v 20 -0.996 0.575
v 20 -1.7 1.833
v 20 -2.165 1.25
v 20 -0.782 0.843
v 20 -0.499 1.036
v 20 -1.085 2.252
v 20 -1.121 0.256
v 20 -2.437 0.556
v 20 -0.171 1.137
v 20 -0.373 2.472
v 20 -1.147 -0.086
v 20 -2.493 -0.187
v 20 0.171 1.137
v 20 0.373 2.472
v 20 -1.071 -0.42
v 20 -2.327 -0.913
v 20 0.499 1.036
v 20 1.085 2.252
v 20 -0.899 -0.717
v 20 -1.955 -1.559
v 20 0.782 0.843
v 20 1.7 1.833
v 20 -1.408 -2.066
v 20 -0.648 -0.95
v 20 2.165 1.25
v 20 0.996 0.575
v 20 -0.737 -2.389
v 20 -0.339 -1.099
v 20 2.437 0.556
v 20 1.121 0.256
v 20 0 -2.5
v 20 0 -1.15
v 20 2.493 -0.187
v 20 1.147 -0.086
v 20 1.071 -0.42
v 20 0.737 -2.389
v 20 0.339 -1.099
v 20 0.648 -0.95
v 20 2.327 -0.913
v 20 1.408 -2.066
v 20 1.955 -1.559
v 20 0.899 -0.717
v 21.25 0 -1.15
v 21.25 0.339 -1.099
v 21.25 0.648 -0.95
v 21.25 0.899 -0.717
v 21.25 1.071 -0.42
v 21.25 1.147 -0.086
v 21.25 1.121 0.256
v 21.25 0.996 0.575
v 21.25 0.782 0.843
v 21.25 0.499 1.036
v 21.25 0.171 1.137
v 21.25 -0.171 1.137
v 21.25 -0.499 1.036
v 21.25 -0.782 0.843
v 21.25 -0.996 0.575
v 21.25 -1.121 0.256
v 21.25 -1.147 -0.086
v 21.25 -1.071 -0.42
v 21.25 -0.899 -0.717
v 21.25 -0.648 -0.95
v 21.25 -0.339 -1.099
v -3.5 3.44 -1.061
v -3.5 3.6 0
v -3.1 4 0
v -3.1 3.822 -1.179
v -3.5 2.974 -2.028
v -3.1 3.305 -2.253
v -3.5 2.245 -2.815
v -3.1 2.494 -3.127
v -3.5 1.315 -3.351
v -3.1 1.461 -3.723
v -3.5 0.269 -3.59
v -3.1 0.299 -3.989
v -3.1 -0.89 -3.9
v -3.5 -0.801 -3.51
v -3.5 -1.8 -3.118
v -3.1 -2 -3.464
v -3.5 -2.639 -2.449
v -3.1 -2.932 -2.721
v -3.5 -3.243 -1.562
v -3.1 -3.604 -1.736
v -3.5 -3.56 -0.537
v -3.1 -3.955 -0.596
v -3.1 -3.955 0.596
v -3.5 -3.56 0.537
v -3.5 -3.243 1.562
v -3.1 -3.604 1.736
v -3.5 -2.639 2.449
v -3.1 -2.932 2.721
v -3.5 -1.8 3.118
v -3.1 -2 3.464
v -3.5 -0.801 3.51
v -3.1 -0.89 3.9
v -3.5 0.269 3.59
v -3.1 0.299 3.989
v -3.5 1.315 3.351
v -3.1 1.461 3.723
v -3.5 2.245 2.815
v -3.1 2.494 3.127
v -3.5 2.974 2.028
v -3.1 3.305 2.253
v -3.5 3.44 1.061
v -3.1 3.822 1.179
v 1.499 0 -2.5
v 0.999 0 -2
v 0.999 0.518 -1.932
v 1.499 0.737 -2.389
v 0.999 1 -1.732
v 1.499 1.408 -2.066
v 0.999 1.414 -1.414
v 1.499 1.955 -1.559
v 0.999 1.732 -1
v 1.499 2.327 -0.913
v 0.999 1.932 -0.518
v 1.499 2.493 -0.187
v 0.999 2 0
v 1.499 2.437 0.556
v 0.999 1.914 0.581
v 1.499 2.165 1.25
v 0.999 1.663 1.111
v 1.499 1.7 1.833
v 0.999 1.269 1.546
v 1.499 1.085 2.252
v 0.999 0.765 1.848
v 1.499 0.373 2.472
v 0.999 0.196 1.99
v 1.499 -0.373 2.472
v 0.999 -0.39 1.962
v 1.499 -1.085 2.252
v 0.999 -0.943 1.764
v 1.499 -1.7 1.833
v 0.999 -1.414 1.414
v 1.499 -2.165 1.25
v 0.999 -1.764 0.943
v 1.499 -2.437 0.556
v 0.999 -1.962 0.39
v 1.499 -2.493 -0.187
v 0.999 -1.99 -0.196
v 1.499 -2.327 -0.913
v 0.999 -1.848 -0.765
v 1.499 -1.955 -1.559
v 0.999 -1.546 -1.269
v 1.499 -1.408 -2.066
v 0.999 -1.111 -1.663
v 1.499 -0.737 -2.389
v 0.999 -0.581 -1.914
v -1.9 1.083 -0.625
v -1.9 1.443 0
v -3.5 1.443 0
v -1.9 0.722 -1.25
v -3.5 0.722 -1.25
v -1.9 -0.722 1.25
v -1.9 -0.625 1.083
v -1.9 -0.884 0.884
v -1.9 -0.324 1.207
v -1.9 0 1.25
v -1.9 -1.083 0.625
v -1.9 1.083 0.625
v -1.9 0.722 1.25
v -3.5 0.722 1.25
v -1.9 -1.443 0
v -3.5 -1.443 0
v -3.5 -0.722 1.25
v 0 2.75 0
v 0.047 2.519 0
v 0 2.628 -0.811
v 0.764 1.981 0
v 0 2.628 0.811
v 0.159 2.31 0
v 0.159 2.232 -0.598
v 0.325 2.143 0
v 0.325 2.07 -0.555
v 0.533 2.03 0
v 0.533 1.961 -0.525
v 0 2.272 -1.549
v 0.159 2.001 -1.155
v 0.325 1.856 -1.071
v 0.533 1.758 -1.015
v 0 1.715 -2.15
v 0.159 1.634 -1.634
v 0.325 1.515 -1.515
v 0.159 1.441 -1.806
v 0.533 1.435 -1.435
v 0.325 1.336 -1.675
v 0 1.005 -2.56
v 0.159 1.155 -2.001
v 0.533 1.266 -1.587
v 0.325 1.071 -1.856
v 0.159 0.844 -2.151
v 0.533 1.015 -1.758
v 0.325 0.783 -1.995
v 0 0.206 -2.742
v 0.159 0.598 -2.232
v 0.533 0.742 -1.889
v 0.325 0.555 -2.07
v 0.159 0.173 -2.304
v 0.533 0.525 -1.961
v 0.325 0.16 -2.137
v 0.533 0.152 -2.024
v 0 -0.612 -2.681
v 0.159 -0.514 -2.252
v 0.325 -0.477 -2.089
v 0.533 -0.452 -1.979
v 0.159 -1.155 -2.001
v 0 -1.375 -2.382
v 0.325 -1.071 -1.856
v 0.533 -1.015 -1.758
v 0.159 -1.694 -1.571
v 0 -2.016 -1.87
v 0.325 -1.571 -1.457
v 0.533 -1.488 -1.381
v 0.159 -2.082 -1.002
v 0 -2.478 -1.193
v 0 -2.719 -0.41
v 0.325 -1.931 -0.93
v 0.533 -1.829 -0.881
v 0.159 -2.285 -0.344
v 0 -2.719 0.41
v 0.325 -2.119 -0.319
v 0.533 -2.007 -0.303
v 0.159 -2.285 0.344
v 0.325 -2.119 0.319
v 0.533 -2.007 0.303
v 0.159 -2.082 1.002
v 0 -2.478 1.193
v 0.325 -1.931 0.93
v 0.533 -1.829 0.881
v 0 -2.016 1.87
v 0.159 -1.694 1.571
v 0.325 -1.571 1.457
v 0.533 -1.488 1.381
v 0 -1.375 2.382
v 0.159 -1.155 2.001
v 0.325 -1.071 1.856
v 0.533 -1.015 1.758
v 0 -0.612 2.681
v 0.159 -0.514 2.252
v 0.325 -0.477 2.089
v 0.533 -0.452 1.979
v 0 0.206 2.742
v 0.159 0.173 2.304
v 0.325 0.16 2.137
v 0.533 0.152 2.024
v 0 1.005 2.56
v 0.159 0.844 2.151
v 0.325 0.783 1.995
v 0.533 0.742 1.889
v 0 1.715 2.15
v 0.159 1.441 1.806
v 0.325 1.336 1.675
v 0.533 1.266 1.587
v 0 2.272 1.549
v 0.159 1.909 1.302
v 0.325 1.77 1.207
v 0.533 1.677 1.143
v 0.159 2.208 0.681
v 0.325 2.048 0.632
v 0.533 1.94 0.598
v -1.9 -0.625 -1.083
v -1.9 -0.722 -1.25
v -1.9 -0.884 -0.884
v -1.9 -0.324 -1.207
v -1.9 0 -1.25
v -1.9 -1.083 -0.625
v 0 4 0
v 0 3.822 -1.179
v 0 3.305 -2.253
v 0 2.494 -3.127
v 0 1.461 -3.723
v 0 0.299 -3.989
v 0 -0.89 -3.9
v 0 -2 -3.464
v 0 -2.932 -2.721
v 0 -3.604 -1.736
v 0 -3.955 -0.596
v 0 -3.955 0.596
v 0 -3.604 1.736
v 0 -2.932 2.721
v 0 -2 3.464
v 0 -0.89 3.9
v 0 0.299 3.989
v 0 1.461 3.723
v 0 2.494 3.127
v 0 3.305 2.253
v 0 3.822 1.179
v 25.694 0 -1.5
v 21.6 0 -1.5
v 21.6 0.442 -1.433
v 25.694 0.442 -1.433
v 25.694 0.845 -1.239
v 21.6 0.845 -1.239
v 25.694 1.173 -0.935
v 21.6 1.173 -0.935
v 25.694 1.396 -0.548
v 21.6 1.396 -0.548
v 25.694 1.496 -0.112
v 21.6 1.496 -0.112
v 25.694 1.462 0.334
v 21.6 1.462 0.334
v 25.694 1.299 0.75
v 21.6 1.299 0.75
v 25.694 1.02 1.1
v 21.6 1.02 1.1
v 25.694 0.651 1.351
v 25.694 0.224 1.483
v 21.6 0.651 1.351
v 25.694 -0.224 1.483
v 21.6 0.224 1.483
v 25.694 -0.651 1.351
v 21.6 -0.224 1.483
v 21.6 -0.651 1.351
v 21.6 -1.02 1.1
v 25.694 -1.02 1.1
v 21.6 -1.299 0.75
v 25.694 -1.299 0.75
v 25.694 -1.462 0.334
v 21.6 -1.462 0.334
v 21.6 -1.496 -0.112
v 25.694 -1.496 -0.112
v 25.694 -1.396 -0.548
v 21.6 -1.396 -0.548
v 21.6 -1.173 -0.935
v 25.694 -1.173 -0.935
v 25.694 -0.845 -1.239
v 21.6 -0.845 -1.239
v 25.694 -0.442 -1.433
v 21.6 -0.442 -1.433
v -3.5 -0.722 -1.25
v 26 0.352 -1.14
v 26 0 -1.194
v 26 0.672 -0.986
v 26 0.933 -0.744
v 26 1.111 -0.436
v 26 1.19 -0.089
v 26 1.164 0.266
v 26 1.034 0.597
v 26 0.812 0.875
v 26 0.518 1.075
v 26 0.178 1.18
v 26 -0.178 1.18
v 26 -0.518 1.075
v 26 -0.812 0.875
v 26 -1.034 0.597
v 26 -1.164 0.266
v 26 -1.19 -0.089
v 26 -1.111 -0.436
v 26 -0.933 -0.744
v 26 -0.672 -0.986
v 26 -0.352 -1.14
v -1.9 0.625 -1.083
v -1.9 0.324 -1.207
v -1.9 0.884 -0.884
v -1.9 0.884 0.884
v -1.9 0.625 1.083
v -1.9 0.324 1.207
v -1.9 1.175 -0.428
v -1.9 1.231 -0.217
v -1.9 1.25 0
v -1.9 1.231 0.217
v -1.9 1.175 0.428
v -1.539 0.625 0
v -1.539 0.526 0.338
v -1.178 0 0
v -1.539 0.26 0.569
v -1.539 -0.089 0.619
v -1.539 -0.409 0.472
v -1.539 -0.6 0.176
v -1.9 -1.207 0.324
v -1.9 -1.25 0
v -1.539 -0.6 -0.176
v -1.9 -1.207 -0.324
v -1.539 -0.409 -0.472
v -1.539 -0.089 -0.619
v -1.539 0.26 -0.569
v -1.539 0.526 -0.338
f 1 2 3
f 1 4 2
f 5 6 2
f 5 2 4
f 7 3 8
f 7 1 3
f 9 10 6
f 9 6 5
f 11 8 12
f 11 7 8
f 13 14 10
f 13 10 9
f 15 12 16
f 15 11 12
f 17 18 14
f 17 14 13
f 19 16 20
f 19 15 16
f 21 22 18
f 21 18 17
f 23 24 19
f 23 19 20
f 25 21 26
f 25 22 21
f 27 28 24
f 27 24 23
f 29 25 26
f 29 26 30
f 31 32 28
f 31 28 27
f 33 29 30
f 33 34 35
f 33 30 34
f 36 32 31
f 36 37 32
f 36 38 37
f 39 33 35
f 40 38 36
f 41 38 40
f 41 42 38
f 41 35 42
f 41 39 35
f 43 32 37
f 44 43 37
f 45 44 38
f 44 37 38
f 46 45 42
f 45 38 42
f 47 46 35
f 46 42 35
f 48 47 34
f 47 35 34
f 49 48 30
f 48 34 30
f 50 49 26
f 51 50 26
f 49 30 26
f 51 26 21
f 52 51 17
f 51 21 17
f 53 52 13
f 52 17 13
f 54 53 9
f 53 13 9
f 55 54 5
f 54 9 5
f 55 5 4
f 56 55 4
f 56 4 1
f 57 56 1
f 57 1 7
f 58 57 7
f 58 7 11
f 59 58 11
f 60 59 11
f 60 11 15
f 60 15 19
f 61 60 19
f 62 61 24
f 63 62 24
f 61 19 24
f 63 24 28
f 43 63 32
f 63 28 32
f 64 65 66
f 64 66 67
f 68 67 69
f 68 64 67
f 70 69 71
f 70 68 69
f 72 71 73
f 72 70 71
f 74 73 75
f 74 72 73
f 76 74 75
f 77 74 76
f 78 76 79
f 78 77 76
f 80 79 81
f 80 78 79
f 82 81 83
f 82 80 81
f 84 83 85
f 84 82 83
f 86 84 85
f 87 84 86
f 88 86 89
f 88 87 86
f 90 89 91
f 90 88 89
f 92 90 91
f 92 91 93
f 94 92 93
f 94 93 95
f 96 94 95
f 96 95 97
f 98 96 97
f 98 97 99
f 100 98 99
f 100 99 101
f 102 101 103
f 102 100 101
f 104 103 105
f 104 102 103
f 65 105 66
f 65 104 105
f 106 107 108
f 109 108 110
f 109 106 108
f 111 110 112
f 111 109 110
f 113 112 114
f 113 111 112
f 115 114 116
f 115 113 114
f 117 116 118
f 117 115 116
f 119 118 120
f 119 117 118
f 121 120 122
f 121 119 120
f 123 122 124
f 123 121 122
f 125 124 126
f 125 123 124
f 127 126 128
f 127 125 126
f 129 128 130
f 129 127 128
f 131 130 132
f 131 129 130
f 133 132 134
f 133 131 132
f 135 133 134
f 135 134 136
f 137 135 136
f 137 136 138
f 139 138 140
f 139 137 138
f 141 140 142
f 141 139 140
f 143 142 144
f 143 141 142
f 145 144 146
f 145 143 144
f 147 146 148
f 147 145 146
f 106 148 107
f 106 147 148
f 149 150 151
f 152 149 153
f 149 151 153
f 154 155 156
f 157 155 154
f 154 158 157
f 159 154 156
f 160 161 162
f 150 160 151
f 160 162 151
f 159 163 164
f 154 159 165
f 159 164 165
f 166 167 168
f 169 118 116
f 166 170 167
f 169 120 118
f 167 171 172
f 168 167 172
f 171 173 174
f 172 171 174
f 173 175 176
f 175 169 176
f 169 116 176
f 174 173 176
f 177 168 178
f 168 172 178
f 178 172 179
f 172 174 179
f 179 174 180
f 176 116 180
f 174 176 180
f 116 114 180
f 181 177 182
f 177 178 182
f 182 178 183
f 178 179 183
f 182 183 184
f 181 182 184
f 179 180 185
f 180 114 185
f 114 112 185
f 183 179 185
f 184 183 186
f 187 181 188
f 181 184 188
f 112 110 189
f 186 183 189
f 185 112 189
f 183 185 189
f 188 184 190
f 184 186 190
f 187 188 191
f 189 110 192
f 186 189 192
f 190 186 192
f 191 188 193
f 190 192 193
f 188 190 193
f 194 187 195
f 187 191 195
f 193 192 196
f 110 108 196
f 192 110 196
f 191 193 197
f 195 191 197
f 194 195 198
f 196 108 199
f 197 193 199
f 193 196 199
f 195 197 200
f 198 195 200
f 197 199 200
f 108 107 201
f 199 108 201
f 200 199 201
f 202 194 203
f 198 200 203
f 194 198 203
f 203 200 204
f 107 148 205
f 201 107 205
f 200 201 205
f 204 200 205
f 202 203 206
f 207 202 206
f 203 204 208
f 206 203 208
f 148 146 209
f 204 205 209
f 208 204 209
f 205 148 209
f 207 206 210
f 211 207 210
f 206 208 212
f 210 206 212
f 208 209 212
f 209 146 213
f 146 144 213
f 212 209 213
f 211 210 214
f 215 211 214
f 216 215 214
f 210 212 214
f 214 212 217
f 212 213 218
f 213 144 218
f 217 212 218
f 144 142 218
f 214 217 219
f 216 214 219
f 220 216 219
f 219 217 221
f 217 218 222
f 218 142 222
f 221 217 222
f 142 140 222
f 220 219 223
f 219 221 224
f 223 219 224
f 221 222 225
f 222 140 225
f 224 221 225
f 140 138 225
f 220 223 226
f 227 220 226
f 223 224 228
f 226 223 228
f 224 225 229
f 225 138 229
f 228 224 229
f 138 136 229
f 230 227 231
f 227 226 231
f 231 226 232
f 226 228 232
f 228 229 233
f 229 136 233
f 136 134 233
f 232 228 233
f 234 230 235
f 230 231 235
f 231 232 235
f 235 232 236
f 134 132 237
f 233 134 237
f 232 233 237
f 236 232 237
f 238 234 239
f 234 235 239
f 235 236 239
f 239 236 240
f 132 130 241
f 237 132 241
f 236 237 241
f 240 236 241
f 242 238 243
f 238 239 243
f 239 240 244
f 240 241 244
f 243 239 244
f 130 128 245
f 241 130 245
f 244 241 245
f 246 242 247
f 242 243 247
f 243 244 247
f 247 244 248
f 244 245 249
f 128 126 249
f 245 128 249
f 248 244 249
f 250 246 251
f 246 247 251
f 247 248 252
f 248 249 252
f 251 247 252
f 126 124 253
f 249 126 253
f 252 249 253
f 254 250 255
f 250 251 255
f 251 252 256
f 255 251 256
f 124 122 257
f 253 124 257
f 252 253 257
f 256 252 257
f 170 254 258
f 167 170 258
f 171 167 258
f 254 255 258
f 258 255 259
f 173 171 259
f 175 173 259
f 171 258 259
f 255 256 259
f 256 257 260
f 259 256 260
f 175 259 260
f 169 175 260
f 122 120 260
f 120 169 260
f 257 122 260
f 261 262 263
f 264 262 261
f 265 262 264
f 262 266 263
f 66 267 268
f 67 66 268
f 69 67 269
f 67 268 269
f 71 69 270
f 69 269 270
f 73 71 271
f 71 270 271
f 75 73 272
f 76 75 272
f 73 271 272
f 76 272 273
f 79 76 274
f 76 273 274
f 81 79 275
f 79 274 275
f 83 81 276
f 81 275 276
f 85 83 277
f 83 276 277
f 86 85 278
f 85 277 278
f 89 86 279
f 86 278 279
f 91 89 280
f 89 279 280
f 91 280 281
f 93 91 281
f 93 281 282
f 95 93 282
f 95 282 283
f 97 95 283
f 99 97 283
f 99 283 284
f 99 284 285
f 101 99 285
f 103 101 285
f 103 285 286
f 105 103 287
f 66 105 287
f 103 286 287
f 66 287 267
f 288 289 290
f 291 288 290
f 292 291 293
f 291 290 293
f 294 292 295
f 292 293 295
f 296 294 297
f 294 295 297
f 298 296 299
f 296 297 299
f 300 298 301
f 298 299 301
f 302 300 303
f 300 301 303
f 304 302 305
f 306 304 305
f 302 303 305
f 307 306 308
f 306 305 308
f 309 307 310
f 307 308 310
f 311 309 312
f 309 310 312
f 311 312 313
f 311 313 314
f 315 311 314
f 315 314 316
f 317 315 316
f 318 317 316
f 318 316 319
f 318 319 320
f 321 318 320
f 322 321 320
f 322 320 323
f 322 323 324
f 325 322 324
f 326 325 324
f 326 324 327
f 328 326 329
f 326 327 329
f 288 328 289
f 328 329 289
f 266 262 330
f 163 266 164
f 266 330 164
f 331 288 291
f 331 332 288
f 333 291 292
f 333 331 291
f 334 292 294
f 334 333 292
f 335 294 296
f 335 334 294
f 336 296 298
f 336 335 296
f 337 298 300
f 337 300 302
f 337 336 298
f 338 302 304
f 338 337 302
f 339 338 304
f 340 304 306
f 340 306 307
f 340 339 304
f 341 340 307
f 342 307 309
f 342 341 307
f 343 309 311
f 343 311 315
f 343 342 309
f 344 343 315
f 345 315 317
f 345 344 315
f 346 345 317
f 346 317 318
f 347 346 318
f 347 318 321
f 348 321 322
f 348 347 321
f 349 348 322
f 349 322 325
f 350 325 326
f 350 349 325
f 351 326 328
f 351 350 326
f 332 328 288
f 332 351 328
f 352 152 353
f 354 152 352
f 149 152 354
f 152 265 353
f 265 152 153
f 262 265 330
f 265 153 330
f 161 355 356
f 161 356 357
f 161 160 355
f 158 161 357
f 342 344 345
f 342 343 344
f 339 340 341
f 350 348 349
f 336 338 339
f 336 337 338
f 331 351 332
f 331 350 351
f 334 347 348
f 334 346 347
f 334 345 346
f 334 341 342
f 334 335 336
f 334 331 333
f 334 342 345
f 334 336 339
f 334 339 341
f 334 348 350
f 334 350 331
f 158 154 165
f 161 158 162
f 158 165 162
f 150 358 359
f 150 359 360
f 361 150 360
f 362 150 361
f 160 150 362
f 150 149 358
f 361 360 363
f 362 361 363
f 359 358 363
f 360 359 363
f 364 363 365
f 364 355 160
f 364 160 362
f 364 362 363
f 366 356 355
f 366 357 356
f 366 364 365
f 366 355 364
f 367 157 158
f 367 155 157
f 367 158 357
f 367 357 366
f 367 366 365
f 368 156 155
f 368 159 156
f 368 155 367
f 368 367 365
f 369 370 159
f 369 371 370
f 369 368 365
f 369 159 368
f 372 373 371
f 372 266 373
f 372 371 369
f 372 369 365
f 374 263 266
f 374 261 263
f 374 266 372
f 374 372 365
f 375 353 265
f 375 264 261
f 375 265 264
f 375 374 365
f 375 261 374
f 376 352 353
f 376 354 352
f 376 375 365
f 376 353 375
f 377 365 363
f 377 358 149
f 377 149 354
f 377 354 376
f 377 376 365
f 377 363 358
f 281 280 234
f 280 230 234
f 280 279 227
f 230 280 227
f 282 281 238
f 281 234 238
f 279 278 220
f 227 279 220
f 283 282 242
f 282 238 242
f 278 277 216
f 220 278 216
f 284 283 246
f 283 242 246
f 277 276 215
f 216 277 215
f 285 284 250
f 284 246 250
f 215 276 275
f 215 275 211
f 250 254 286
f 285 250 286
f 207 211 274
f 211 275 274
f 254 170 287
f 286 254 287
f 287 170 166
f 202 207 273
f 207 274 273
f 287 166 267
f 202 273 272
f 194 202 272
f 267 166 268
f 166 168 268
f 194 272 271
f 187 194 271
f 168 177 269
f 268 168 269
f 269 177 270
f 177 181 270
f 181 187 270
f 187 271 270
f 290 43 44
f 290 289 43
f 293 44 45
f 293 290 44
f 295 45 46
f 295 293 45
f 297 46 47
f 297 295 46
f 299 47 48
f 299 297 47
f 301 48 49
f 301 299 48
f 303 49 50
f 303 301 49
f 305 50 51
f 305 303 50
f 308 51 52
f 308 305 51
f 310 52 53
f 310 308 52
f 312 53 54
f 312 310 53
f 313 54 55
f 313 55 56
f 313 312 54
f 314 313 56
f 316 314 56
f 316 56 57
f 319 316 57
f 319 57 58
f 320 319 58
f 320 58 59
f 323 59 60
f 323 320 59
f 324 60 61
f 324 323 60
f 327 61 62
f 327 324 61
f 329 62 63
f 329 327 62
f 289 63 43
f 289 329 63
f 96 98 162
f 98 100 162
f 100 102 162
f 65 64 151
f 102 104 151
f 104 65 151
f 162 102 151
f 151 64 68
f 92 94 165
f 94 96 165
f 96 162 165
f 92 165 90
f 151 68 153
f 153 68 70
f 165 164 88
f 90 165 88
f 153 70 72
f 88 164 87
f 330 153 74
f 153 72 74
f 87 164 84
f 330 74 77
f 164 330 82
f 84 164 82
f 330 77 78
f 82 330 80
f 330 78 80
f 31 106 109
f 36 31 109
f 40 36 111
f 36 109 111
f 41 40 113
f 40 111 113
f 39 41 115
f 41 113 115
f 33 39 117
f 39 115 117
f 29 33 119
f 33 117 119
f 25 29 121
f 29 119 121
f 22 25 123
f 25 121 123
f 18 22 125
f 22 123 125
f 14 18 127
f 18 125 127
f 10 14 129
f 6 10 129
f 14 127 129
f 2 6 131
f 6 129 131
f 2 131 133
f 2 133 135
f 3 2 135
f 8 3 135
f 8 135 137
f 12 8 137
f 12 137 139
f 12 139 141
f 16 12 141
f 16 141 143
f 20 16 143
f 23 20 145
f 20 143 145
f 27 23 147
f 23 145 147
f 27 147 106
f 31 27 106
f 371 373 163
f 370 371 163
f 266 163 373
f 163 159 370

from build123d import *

# Parameters (mm, degrees)
SKETCH2_R           = 2
BOSS_EXTRUDE1_DEPTH = 0.5
BOSS_EXTRUDE1_TAPER = -45
SKETCH3_R           = 2.5
BOSS_EXTRUDE2_DEPTH = 18.501
SKETCH4_R           = 1.15
BOSS_EXTRUDE3_DEPTH = 1.25
SKETCH5_R           = 1.15
BOSS_EXTRUDE4_DEPTH = 0.35
BOSS_EXTRUDE4_TAPER = -44.999999995
SKETCH6_R           = 1.5
BOSS_EXTRUDE5_DEPTH = 4.0935
SKETCH7_R           = 1.5
BOSS_EXTRUDE6_DEPTH = 0.3065
BOSS_EXTRUDE6_TAPER = 45
CUT_EXTRUDE1_DEPTH  = 1.6
CHAMFER1_SIZE       = 0.4


with BuildPart() as part:
    # Sketch1 → Revolve1 (revolve)
    with BuildSketch(Plane(origin=(0, 0, 0), x_dir=(-1, 0, 0), z_dir=(0, 0, -1))):
        with BuildLine():
            Line((-0.999, 2), (-0.999, 0))
            Line((-0.999, 0), (3.5, 0))
            Line((3.5, 0), (3.5, 4))
            Line((3.5, 4), (0, 4))
            Line((0, 4), (0, 2.75))
            ThreePointArc((0, 2.75), (-0.325180465, 2.142806379), (-0.999, 2))
        make_face()
    revolve(axis=Axis((0.999, 0, 0), (-1, 0, 0)))

    # Sketch2 → Boss-Extrude1 (add)
    with BuildSketch(Plane(origin=(0.999, 0, 0), x_dir=(0, 0, -1), z_dir=(1, 0, 0))):
        Circle(SKETCH2_R)
    extrude(amount=BOSS_EXTRUDE1_DEPTH, taper=BOSS_EXTRUDE1_TAPER)

    # Sketch3 → Boss-Extrude2 (add)
    with BuildSketch(Plane(origin=(1.499, 0, 0), x_dir=(0, 0, -1), z_dir=(1, 0, 0))):
        Circle(SKETCH3_R)
    extrude(amount=BOSS_EXTRUDE2_DEPTH)

    # Sketch4 → Boss-Extrude3 (add)
    with BuildSketch(Plane(origin=(20, 0, 0), x_dir=(0, 0, -1), z_dir=(1, 0, 0))):
        Circle(SKETCH4_R)
    extrude(amount=BOSS_EXTRUDE3_DEPTH)

    # Sketch5 → Boss-Extrude4 (add)
    with BuildSketch(Plane(origin=(21.25, 0, 0), x_dir=(0, 0, -1), z_dir=(1, 0, 0))):
        Circle(SKETCH5_R)
    extrude(amount=BOSS_EXTRUDE4_DEPTH, taper=BOSS_EXTRUDE4_TAPER)

    # Sketch6 → Boss-Extrude5 (add)
    with BuildSketch(Plane(origin=(21.6, 0, 0), x_dir=(0, 0, -1), z_dir=(1, 0, 0))):
        Circle(SKETCH6_R)
    extrude(amount=BOSS_EXTRUDE5_DEPTH)

    # Sketch7 → Boss-Extrude6 (add)
    with BuildSketch(Plane(origin=(25.6935, 0, 0), x_dir=(0, 0, -1), z_dir=(1, 0, 0))):
        Circle(SKETCH7_R)
    extrude(amount=BOSS_EXTRUDE6_DEPTH, taper=BOSS_EXTRUDE6_TAPER)

    # Sketch8 → Cut-Extrude1 (cut)
    with BuildSketch(Plane.ZY.offset(3.5)):
        Polygon((0, 1.443375673), (-1.25, 0.721687836), (-1.25, -0.721687836), (0, -1.443375673), (1.25, -0.721687836), (1.25, 0.721687836), align=None)
    extrude(amount=-CUT_EXTRUDE1_DEPTH, mode=Mode.SUBTRACT)

    # Sketch9 → Cut-Revolve1 (revolve, cut)
    with BuildSketch(Plane.XY):
        Polygon((-1.9, 1.25), (-1.9, 0), (-1.178312164, 0), align=None)
    revolve(axis=Axis((-1.9, 0, 0), (1, 0, 0)), mode=Mode.SUBTRACT)

    # Chamfer1
    chamfer1_edges = [part.edges().sort_by_distance(p)[0] for p in [
        (-3.5, -4, 0),
    ]]
    chamfer(chamfer1_edges, length=CHAMFER1_SIZE)


solid = part.part
